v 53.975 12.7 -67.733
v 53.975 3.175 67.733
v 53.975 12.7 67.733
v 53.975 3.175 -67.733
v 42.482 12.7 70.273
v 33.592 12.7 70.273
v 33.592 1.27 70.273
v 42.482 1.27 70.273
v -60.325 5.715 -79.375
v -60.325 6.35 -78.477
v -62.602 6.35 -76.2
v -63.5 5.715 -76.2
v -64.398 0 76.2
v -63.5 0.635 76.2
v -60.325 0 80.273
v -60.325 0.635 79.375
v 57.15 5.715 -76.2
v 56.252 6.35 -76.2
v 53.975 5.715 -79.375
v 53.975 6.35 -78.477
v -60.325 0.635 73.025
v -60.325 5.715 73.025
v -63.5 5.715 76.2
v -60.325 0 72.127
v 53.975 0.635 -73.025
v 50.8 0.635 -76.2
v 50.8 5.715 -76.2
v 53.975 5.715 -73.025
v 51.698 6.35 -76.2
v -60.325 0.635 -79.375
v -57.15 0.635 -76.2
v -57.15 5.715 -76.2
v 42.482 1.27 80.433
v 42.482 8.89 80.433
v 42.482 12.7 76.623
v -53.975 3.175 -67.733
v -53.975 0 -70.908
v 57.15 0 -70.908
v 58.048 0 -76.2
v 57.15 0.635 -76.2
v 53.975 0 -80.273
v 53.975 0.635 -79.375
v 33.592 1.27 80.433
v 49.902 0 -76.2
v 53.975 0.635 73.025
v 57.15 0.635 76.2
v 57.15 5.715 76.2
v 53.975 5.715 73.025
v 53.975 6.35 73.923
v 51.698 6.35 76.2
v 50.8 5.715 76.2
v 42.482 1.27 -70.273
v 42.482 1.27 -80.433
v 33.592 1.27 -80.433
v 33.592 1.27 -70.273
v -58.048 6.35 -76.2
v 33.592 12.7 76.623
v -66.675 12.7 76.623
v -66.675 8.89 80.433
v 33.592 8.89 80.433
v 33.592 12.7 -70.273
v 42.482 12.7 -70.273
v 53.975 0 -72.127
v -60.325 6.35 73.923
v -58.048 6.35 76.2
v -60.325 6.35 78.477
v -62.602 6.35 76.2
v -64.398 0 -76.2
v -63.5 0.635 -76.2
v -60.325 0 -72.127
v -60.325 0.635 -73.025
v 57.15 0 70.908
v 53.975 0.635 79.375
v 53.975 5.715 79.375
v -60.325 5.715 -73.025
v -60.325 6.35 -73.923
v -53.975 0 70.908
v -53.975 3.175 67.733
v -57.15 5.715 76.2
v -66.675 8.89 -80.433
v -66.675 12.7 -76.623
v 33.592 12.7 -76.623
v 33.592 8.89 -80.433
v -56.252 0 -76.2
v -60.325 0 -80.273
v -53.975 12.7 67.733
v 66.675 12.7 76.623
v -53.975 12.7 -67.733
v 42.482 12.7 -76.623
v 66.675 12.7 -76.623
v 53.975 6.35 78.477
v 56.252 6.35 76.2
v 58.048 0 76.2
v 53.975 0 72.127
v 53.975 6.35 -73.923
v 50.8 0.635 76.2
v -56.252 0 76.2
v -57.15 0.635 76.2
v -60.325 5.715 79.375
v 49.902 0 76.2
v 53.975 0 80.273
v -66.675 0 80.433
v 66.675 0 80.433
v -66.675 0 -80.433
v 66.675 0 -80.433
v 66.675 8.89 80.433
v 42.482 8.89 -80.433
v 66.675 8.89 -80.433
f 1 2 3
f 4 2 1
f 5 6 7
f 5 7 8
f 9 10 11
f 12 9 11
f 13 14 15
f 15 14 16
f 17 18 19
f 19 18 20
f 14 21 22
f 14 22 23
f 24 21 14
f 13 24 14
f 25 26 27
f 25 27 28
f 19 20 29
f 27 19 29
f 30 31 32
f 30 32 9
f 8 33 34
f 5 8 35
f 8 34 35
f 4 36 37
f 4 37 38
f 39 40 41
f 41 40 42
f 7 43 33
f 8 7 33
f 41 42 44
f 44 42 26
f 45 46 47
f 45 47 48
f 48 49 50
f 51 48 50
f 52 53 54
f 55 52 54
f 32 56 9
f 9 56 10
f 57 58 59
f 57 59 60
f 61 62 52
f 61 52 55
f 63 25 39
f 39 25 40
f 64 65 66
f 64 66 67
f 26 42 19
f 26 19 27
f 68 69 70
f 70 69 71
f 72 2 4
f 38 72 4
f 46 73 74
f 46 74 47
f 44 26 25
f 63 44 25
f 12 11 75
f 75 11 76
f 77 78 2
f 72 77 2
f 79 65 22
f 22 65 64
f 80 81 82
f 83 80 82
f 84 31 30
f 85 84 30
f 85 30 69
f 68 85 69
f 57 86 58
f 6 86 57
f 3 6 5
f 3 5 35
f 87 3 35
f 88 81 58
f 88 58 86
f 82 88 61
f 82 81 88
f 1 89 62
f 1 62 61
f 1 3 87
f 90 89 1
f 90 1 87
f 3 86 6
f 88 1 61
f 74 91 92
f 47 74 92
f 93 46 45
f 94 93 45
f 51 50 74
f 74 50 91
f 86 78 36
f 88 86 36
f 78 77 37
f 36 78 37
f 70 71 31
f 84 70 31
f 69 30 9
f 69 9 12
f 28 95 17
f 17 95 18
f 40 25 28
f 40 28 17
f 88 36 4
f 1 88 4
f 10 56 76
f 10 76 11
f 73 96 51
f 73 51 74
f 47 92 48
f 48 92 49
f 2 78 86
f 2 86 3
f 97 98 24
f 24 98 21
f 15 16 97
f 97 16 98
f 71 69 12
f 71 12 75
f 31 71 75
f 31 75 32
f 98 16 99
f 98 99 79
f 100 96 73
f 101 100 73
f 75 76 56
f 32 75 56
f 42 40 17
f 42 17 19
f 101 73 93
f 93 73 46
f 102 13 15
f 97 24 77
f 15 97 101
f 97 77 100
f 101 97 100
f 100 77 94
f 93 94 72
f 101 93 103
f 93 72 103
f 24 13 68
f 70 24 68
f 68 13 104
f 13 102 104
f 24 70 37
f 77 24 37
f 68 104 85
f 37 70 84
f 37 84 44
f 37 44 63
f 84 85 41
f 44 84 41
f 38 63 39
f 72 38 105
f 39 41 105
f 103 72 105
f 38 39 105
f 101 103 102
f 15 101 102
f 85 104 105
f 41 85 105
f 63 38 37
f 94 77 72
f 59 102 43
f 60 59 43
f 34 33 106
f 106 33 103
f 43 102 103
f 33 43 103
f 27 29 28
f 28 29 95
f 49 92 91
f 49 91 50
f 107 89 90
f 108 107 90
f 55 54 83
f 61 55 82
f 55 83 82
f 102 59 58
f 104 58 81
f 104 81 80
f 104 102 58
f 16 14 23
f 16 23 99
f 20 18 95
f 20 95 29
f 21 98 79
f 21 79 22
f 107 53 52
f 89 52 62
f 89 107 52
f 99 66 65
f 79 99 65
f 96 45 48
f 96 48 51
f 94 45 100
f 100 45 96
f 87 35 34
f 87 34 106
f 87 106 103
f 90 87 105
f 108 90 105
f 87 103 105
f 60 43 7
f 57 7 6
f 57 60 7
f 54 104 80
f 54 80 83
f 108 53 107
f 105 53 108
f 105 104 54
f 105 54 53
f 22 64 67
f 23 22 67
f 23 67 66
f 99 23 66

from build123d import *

# Parameters (mm, degrees)
SKETCH2_W           = 133.35
SKETCH2_H           = 160.866666666
SKETCH2_W_2         = 107.95
SKETCH2_H_2         = 135.466666666
BOSS_EXTRUDE1_DEPTH = 12.7
CUT_EXTRUDE1_DEPTH  = 6.35
CHAMFER4_SIZE       = 3.81
CHAMFER1_SIZE       = 0.635
CHAMFER2_SIZE       = 3.175
SKETCH4_W           = 8.89
SKETCH4_H           = 11.43
CUT_EXTRUDE2_DEPTH  = 10.16
SKETCH5_W           = 8.89
SKETCH5_H           = 11.43
CUT_EXTRUDE3_DEPTH  = 10.16


with BuildPart() as part:
    # Sketch2 → Boss-Extrude1 (new body)
    with BuildSketch(Plane(origin=(0, 0, 0), x_dir=(1, 0, 0), z_dir=(0, 1, 0))):
        Rectangle(SKETCH2_W, SKETCH2_H)
        Rectangle(SKETCH2_W_2, SKETCH2_H_2, mode=Mode.SUBTRACT)
    extrude(amount=BOSS_EXTRUDE1_DEPTH)

    # Sketch3 → Cut-Extrude1 (cut)
    with BuildSketch(Plane.XZ):
        Polygon((-57.15, 76.2), (-60.325, 73.025), (-63.5, 76.2), (-60.325, 79.375), align=None)
        Polygon((57.15, 76.2), (53.975, 73.025), (50.8, 76.2), (53.975, 79.375), align=None)
        Polygon((57.15, -76.2), (53.975, -79.375), (50.8, -76.2), (53.975, -73.025), align=None)
        Polygon((-57.15, -76.2), (-60.325, -79.375), (-63.5, -76.2), (-60.325, -73.025), align=None)
    extrude(amount=-CUT_EXTRUDE1_DEPTH, mode=Mode.SUBTRACT)

    # Chamfer4
    chamfer4_edges = [part.edges().sort_by_distance(p)[0] for p in [
        (0, 12.7, -80.433333333),
        (0, 12.7, 80.433333333),
    ]]
    chamfer(chamfer4_edges, length=CHAMFER4_SIZE)

    # Chamfer1
    chamfer1_edges = [part.edges().sort_by_distance(p)[0] for p in [
        (-58.7375, 6.35, -74.6125),
        (-58.7375, 6.35, -77.7875),
        (-61.9125, 6.35, -77.7875),
        (-61.9125, 6.35, -74.6125),
        (-58.7375, 0, -74.6125),
        (-61.9125, 0, -74.6125),
        (-61.9125, 0, -77.7875),
        (-58.7375, 0, -77.7875),
        (55.5625, 6.35, -74.6125),
        (55.5625, 6.35, -77.7875),
        (52.3875, 6.35, -77.7875),
        (52.3875, 6.35, -74.6125),
        (55.5625, 0, -74.6125),
        (52.3875, 0, -74.6125),
        (52.3875, 0, -77.7875),
        (55.5625, 0, -77.7875),
        (55.5625, 6.35, 77.7875),
        (55.5625, 6.35, 74.6125),
        (52.3875, 6.35, 74.6125),
        (52.3875, 6.35, 77.7875),
        (55.5625, 0, 77.7875),
        (52.3875, 0, 77.7875),
        (52.3875, 0, 74.6125),
        (55.5625, 0, 74.6125),
        (-58.7375, 6.35, 77.7875),
        (-58.7375, 6.35, 74.6125),
        (-61.9125, 6.35, 74.6125),
        (-61.9125, 6.35, 77.7875),
        (-58.7375, 0, 77.7875),
        (-61.9125, 0, 77.7875),
        (-61.9125, 0, 74.6125),
        (-58.7375, 0, 74.6125),
    ]]
    chamfer(chamfer1_edges, length=CHAMFER1_SIZE)

    # Chamfer2
    chamfer2_edges = [part.edges().sort_by_distance(p)[0] for p in [
        (53.975, 0, 0),
        (0, 0, -67.733333333),
        (0, 0, 67.733333333),
    ]]
    chamfer(chamfer2_edges, length=CHAMFER2_SIZE)

    # Sketch4 → Cut-Extrude2 (cut)
    with BuildSketch(Plane.XY.offset(80.433333333)):
        with Locations((38.0365, 6.985)):
            Rectangle(SKETCH4_W, SKETCH4_H)
    extrude(amount=-CUT_EXTRUDE2_DEPTH, mode=Mode.SUBTRACT)

    # Sketch5 → Cut-Extrude3 (cut)
    with BuildSketch(Plane(origin=(0, 0, -80.433333333), x_dir=(-1, 0, 0), z_dir=(0, 0, -1))):
        with Locations((-38.0365, 6.985)):
            Rectangle(SKETCH5_W, SKETCH5_H)
    extrude(amount=-CUT_EXTRUDE3_DEPTH, mode=Mode.SUBTRACT)


solid = part.part
